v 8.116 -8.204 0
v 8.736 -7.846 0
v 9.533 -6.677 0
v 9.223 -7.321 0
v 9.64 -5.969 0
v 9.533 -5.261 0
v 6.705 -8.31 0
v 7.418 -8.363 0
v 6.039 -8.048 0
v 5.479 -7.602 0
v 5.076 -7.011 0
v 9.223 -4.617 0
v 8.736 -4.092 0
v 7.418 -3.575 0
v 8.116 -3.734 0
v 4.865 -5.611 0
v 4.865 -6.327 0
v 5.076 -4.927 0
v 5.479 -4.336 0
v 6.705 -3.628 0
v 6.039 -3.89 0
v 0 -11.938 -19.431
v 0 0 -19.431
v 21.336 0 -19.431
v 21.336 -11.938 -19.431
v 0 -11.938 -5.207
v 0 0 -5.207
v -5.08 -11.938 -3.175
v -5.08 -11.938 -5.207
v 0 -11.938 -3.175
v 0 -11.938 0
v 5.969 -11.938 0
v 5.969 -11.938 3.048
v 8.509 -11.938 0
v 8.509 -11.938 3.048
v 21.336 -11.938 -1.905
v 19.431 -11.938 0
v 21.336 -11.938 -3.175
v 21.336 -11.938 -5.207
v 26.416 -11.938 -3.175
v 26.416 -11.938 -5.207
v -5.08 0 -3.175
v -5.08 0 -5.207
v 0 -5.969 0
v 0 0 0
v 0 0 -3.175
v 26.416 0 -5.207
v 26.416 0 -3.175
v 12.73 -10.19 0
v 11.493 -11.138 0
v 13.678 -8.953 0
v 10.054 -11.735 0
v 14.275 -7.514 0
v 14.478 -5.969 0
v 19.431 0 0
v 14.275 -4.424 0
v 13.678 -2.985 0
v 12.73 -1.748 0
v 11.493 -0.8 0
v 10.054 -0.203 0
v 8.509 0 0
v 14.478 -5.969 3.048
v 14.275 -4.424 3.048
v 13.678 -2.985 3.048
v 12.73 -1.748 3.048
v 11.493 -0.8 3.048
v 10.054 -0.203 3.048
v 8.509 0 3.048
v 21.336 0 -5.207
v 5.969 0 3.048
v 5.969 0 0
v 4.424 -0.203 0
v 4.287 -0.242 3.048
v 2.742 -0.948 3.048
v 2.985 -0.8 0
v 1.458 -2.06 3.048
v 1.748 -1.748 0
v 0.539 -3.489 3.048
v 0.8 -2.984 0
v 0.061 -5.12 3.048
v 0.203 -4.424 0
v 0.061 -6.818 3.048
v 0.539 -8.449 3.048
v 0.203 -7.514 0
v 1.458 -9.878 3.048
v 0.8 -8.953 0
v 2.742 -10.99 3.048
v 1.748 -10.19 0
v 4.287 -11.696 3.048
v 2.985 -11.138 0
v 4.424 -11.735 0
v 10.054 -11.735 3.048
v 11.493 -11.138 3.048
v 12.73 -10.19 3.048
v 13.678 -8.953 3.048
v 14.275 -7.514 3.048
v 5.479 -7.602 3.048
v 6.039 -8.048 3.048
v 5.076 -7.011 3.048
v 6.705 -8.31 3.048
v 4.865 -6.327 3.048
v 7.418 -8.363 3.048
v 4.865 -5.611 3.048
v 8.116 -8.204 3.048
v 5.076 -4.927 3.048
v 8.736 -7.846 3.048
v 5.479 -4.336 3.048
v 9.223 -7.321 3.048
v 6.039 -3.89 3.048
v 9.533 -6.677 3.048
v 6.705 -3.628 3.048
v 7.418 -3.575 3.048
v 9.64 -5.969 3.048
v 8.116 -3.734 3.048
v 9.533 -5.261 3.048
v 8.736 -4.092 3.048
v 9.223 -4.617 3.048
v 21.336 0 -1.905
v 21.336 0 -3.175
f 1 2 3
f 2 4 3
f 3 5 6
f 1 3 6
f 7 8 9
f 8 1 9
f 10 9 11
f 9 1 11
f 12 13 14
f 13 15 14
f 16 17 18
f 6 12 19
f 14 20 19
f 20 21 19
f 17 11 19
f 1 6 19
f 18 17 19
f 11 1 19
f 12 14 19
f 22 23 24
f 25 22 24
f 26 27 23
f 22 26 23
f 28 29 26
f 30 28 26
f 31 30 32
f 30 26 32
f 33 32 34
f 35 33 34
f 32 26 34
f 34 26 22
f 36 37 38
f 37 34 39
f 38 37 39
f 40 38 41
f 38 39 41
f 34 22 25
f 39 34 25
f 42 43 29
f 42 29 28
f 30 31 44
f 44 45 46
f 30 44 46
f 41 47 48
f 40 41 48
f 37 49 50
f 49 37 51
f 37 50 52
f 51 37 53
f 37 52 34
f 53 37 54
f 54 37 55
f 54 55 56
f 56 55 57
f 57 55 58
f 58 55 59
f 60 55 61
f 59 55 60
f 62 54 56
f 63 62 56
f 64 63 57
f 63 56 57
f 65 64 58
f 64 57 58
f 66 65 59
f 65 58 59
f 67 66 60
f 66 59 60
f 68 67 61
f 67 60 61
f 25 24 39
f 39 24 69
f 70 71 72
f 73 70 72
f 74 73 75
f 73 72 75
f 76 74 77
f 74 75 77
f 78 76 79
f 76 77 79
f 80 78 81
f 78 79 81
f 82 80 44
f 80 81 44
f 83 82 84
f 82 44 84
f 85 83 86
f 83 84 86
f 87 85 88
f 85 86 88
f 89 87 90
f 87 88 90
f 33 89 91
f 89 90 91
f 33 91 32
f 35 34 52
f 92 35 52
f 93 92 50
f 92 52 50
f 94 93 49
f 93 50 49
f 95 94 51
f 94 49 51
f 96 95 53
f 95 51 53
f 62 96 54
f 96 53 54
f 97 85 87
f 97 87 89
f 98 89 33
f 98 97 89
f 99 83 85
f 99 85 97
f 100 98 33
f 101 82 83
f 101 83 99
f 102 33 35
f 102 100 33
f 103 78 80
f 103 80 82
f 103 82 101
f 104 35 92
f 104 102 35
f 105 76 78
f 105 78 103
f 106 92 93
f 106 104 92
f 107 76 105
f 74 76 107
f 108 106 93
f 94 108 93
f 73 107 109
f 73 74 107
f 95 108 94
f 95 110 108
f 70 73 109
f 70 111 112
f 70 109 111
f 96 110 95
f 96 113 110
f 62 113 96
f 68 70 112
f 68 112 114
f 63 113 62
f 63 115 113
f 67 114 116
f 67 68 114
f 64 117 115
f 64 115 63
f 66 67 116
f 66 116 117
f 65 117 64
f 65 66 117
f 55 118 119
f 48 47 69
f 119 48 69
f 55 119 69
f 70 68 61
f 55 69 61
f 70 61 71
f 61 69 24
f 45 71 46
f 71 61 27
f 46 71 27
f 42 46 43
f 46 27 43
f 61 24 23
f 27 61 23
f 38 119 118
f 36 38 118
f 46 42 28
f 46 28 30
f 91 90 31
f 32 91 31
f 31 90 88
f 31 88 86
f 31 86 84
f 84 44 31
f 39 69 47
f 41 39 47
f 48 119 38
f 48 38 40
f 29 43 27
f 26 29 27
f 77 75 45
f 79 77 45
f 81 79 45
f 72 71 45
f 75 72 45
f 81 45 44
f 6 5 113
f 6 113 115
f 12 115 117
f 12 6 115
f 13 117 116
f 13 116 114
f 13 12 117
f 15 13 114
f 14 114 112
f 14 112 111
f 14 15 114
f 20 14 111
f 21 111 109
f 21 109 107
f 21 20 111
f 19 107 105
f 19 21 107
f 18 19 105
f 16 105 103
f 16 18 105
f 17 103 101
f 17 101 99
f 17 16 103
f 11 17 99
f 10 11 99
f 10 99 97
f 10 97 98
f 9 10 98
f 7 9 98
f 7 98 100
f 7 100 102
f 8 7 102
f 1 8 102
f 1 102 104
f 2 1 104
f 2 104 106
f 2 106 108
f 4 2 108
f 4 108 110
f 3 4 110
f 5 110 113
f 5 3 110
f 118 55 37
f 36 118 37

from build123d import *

# Parameters (mm, degrees)
F0_W     = 5.08
F0_H     = 2.032
F1_DEPTH = 11.938
F2_SIZE  = 1.905
F3_R     = 2.4007388602
F4_DEPTH = 3.048


with BuildPart() as f1:
    # F0 (on Front) → F1 (new body)
    with BuildSketch(Plane.XZ):
        with Locations((-2.54, -4.191)):
            Rectangle(F0_W, F0_H)
        with Locations((23.876, -4.191)):
            Rectangle(F0_W, F0_H)
        Polygon((14.478, 0), (0, 0), (0, -3.175), (0, -5.207), (0, -19.431), (21.336, -19.431), (21.336, -5.207), (21.336, -3.175), (21.336, 0), align=None)
    extrude(amount=F1_DEPTH)

    # F2
    f2_edges = [f1.edges().sort_by_distance(p)[0] for p in [
        (21.336, -5.969, 0),
    ]]
    chamfer(f2_edges, length=F2_SIZE)

    # F3 (on face) → F4 (join)
    with BuildSketch(Plane.XY):
        with BuildLine():
            ThreePointArc((7.239, -0.1366710484), (6.6076663792, -0.0342661175), (5.969, 0))
            ThreePointArc((5.969, 0), (0, -5.969), (5.969, -11.938))
            ThreePointArc((5.969, -11.938), (6.6076663792, -11.9037338825), (7.239, -11.8013289516))
            ThreePointArc((7.239, -11.8013289516), (2.54, -5.969), (7.239, -0.1366710484))
        make_face()
        with BuildLine():
            Line((8.509, 0), (5.969, 0))
            ThreePointArc((5.969, 0), (6.6076663792, -0.0342661175), (7.239, -0.1366710484))
            ThreePointArc((7.239, -0.1366710484), (7.8703336208, -0.0342661175), (8.509, 0))
        make_face()
        with BuildLine():
            ThreePointArc((7.239, -11.8013289516), (6.6076663792, -11.9037338825), (5.969, -11.938))
            Line((5.969, -11.938), (8.509, -11.938))
            ThreePointArc((8.509, -11.938), (7.8703336208, -11.9037338825), (7.239, -11.8013289516))
        make_face()
        with BuildLine():
            ThreePointArc((8.509, 0), (7.8703336208, -0.0342661175), (7.239, -0.1366710484))
            ThreePointArc((7.239, -0.1366710484), (10.6170959005, -2.2241147548), (11.938, -5.969))
            ThreePointArc((11.938, -5.969), (10.6170959005, -9.7138852452), (7.239, -11.8013289516))
            ThreePointArc((7.239, -11.8013289516), (7.8703336208, -11.9037338825), (8.509, -11.938))
            ThreePointArc((8.509, -11.938), (12.7297203769, -10.1897203769), (14.478, -5.969))
            ThreePointArc((14.478, -5.969), (12.7297203769, -1.7482796231), (8.509, 0))
        make_face()
        with BuildLine():
            ThreePointArc((7.239, -11.8013289516), (10.6170959005, -9.7138852452), (11.938, -5.969))
            ThreePointArc((11.938, -5.969), (10.6170959005, -2.2241147548), (7.239, -0.1366710484))
            ThreePointArc((7.239, -0.1366710484), (2.54, -5.969), (7.239, -11.8013289516))
        make_face()
        with Locations((7.239, -5.969)):
            Circle(F3_R, mode=Mode.SUBTRACT)
    extrude(amount=F4_DEPTH)


solid = f1.part
